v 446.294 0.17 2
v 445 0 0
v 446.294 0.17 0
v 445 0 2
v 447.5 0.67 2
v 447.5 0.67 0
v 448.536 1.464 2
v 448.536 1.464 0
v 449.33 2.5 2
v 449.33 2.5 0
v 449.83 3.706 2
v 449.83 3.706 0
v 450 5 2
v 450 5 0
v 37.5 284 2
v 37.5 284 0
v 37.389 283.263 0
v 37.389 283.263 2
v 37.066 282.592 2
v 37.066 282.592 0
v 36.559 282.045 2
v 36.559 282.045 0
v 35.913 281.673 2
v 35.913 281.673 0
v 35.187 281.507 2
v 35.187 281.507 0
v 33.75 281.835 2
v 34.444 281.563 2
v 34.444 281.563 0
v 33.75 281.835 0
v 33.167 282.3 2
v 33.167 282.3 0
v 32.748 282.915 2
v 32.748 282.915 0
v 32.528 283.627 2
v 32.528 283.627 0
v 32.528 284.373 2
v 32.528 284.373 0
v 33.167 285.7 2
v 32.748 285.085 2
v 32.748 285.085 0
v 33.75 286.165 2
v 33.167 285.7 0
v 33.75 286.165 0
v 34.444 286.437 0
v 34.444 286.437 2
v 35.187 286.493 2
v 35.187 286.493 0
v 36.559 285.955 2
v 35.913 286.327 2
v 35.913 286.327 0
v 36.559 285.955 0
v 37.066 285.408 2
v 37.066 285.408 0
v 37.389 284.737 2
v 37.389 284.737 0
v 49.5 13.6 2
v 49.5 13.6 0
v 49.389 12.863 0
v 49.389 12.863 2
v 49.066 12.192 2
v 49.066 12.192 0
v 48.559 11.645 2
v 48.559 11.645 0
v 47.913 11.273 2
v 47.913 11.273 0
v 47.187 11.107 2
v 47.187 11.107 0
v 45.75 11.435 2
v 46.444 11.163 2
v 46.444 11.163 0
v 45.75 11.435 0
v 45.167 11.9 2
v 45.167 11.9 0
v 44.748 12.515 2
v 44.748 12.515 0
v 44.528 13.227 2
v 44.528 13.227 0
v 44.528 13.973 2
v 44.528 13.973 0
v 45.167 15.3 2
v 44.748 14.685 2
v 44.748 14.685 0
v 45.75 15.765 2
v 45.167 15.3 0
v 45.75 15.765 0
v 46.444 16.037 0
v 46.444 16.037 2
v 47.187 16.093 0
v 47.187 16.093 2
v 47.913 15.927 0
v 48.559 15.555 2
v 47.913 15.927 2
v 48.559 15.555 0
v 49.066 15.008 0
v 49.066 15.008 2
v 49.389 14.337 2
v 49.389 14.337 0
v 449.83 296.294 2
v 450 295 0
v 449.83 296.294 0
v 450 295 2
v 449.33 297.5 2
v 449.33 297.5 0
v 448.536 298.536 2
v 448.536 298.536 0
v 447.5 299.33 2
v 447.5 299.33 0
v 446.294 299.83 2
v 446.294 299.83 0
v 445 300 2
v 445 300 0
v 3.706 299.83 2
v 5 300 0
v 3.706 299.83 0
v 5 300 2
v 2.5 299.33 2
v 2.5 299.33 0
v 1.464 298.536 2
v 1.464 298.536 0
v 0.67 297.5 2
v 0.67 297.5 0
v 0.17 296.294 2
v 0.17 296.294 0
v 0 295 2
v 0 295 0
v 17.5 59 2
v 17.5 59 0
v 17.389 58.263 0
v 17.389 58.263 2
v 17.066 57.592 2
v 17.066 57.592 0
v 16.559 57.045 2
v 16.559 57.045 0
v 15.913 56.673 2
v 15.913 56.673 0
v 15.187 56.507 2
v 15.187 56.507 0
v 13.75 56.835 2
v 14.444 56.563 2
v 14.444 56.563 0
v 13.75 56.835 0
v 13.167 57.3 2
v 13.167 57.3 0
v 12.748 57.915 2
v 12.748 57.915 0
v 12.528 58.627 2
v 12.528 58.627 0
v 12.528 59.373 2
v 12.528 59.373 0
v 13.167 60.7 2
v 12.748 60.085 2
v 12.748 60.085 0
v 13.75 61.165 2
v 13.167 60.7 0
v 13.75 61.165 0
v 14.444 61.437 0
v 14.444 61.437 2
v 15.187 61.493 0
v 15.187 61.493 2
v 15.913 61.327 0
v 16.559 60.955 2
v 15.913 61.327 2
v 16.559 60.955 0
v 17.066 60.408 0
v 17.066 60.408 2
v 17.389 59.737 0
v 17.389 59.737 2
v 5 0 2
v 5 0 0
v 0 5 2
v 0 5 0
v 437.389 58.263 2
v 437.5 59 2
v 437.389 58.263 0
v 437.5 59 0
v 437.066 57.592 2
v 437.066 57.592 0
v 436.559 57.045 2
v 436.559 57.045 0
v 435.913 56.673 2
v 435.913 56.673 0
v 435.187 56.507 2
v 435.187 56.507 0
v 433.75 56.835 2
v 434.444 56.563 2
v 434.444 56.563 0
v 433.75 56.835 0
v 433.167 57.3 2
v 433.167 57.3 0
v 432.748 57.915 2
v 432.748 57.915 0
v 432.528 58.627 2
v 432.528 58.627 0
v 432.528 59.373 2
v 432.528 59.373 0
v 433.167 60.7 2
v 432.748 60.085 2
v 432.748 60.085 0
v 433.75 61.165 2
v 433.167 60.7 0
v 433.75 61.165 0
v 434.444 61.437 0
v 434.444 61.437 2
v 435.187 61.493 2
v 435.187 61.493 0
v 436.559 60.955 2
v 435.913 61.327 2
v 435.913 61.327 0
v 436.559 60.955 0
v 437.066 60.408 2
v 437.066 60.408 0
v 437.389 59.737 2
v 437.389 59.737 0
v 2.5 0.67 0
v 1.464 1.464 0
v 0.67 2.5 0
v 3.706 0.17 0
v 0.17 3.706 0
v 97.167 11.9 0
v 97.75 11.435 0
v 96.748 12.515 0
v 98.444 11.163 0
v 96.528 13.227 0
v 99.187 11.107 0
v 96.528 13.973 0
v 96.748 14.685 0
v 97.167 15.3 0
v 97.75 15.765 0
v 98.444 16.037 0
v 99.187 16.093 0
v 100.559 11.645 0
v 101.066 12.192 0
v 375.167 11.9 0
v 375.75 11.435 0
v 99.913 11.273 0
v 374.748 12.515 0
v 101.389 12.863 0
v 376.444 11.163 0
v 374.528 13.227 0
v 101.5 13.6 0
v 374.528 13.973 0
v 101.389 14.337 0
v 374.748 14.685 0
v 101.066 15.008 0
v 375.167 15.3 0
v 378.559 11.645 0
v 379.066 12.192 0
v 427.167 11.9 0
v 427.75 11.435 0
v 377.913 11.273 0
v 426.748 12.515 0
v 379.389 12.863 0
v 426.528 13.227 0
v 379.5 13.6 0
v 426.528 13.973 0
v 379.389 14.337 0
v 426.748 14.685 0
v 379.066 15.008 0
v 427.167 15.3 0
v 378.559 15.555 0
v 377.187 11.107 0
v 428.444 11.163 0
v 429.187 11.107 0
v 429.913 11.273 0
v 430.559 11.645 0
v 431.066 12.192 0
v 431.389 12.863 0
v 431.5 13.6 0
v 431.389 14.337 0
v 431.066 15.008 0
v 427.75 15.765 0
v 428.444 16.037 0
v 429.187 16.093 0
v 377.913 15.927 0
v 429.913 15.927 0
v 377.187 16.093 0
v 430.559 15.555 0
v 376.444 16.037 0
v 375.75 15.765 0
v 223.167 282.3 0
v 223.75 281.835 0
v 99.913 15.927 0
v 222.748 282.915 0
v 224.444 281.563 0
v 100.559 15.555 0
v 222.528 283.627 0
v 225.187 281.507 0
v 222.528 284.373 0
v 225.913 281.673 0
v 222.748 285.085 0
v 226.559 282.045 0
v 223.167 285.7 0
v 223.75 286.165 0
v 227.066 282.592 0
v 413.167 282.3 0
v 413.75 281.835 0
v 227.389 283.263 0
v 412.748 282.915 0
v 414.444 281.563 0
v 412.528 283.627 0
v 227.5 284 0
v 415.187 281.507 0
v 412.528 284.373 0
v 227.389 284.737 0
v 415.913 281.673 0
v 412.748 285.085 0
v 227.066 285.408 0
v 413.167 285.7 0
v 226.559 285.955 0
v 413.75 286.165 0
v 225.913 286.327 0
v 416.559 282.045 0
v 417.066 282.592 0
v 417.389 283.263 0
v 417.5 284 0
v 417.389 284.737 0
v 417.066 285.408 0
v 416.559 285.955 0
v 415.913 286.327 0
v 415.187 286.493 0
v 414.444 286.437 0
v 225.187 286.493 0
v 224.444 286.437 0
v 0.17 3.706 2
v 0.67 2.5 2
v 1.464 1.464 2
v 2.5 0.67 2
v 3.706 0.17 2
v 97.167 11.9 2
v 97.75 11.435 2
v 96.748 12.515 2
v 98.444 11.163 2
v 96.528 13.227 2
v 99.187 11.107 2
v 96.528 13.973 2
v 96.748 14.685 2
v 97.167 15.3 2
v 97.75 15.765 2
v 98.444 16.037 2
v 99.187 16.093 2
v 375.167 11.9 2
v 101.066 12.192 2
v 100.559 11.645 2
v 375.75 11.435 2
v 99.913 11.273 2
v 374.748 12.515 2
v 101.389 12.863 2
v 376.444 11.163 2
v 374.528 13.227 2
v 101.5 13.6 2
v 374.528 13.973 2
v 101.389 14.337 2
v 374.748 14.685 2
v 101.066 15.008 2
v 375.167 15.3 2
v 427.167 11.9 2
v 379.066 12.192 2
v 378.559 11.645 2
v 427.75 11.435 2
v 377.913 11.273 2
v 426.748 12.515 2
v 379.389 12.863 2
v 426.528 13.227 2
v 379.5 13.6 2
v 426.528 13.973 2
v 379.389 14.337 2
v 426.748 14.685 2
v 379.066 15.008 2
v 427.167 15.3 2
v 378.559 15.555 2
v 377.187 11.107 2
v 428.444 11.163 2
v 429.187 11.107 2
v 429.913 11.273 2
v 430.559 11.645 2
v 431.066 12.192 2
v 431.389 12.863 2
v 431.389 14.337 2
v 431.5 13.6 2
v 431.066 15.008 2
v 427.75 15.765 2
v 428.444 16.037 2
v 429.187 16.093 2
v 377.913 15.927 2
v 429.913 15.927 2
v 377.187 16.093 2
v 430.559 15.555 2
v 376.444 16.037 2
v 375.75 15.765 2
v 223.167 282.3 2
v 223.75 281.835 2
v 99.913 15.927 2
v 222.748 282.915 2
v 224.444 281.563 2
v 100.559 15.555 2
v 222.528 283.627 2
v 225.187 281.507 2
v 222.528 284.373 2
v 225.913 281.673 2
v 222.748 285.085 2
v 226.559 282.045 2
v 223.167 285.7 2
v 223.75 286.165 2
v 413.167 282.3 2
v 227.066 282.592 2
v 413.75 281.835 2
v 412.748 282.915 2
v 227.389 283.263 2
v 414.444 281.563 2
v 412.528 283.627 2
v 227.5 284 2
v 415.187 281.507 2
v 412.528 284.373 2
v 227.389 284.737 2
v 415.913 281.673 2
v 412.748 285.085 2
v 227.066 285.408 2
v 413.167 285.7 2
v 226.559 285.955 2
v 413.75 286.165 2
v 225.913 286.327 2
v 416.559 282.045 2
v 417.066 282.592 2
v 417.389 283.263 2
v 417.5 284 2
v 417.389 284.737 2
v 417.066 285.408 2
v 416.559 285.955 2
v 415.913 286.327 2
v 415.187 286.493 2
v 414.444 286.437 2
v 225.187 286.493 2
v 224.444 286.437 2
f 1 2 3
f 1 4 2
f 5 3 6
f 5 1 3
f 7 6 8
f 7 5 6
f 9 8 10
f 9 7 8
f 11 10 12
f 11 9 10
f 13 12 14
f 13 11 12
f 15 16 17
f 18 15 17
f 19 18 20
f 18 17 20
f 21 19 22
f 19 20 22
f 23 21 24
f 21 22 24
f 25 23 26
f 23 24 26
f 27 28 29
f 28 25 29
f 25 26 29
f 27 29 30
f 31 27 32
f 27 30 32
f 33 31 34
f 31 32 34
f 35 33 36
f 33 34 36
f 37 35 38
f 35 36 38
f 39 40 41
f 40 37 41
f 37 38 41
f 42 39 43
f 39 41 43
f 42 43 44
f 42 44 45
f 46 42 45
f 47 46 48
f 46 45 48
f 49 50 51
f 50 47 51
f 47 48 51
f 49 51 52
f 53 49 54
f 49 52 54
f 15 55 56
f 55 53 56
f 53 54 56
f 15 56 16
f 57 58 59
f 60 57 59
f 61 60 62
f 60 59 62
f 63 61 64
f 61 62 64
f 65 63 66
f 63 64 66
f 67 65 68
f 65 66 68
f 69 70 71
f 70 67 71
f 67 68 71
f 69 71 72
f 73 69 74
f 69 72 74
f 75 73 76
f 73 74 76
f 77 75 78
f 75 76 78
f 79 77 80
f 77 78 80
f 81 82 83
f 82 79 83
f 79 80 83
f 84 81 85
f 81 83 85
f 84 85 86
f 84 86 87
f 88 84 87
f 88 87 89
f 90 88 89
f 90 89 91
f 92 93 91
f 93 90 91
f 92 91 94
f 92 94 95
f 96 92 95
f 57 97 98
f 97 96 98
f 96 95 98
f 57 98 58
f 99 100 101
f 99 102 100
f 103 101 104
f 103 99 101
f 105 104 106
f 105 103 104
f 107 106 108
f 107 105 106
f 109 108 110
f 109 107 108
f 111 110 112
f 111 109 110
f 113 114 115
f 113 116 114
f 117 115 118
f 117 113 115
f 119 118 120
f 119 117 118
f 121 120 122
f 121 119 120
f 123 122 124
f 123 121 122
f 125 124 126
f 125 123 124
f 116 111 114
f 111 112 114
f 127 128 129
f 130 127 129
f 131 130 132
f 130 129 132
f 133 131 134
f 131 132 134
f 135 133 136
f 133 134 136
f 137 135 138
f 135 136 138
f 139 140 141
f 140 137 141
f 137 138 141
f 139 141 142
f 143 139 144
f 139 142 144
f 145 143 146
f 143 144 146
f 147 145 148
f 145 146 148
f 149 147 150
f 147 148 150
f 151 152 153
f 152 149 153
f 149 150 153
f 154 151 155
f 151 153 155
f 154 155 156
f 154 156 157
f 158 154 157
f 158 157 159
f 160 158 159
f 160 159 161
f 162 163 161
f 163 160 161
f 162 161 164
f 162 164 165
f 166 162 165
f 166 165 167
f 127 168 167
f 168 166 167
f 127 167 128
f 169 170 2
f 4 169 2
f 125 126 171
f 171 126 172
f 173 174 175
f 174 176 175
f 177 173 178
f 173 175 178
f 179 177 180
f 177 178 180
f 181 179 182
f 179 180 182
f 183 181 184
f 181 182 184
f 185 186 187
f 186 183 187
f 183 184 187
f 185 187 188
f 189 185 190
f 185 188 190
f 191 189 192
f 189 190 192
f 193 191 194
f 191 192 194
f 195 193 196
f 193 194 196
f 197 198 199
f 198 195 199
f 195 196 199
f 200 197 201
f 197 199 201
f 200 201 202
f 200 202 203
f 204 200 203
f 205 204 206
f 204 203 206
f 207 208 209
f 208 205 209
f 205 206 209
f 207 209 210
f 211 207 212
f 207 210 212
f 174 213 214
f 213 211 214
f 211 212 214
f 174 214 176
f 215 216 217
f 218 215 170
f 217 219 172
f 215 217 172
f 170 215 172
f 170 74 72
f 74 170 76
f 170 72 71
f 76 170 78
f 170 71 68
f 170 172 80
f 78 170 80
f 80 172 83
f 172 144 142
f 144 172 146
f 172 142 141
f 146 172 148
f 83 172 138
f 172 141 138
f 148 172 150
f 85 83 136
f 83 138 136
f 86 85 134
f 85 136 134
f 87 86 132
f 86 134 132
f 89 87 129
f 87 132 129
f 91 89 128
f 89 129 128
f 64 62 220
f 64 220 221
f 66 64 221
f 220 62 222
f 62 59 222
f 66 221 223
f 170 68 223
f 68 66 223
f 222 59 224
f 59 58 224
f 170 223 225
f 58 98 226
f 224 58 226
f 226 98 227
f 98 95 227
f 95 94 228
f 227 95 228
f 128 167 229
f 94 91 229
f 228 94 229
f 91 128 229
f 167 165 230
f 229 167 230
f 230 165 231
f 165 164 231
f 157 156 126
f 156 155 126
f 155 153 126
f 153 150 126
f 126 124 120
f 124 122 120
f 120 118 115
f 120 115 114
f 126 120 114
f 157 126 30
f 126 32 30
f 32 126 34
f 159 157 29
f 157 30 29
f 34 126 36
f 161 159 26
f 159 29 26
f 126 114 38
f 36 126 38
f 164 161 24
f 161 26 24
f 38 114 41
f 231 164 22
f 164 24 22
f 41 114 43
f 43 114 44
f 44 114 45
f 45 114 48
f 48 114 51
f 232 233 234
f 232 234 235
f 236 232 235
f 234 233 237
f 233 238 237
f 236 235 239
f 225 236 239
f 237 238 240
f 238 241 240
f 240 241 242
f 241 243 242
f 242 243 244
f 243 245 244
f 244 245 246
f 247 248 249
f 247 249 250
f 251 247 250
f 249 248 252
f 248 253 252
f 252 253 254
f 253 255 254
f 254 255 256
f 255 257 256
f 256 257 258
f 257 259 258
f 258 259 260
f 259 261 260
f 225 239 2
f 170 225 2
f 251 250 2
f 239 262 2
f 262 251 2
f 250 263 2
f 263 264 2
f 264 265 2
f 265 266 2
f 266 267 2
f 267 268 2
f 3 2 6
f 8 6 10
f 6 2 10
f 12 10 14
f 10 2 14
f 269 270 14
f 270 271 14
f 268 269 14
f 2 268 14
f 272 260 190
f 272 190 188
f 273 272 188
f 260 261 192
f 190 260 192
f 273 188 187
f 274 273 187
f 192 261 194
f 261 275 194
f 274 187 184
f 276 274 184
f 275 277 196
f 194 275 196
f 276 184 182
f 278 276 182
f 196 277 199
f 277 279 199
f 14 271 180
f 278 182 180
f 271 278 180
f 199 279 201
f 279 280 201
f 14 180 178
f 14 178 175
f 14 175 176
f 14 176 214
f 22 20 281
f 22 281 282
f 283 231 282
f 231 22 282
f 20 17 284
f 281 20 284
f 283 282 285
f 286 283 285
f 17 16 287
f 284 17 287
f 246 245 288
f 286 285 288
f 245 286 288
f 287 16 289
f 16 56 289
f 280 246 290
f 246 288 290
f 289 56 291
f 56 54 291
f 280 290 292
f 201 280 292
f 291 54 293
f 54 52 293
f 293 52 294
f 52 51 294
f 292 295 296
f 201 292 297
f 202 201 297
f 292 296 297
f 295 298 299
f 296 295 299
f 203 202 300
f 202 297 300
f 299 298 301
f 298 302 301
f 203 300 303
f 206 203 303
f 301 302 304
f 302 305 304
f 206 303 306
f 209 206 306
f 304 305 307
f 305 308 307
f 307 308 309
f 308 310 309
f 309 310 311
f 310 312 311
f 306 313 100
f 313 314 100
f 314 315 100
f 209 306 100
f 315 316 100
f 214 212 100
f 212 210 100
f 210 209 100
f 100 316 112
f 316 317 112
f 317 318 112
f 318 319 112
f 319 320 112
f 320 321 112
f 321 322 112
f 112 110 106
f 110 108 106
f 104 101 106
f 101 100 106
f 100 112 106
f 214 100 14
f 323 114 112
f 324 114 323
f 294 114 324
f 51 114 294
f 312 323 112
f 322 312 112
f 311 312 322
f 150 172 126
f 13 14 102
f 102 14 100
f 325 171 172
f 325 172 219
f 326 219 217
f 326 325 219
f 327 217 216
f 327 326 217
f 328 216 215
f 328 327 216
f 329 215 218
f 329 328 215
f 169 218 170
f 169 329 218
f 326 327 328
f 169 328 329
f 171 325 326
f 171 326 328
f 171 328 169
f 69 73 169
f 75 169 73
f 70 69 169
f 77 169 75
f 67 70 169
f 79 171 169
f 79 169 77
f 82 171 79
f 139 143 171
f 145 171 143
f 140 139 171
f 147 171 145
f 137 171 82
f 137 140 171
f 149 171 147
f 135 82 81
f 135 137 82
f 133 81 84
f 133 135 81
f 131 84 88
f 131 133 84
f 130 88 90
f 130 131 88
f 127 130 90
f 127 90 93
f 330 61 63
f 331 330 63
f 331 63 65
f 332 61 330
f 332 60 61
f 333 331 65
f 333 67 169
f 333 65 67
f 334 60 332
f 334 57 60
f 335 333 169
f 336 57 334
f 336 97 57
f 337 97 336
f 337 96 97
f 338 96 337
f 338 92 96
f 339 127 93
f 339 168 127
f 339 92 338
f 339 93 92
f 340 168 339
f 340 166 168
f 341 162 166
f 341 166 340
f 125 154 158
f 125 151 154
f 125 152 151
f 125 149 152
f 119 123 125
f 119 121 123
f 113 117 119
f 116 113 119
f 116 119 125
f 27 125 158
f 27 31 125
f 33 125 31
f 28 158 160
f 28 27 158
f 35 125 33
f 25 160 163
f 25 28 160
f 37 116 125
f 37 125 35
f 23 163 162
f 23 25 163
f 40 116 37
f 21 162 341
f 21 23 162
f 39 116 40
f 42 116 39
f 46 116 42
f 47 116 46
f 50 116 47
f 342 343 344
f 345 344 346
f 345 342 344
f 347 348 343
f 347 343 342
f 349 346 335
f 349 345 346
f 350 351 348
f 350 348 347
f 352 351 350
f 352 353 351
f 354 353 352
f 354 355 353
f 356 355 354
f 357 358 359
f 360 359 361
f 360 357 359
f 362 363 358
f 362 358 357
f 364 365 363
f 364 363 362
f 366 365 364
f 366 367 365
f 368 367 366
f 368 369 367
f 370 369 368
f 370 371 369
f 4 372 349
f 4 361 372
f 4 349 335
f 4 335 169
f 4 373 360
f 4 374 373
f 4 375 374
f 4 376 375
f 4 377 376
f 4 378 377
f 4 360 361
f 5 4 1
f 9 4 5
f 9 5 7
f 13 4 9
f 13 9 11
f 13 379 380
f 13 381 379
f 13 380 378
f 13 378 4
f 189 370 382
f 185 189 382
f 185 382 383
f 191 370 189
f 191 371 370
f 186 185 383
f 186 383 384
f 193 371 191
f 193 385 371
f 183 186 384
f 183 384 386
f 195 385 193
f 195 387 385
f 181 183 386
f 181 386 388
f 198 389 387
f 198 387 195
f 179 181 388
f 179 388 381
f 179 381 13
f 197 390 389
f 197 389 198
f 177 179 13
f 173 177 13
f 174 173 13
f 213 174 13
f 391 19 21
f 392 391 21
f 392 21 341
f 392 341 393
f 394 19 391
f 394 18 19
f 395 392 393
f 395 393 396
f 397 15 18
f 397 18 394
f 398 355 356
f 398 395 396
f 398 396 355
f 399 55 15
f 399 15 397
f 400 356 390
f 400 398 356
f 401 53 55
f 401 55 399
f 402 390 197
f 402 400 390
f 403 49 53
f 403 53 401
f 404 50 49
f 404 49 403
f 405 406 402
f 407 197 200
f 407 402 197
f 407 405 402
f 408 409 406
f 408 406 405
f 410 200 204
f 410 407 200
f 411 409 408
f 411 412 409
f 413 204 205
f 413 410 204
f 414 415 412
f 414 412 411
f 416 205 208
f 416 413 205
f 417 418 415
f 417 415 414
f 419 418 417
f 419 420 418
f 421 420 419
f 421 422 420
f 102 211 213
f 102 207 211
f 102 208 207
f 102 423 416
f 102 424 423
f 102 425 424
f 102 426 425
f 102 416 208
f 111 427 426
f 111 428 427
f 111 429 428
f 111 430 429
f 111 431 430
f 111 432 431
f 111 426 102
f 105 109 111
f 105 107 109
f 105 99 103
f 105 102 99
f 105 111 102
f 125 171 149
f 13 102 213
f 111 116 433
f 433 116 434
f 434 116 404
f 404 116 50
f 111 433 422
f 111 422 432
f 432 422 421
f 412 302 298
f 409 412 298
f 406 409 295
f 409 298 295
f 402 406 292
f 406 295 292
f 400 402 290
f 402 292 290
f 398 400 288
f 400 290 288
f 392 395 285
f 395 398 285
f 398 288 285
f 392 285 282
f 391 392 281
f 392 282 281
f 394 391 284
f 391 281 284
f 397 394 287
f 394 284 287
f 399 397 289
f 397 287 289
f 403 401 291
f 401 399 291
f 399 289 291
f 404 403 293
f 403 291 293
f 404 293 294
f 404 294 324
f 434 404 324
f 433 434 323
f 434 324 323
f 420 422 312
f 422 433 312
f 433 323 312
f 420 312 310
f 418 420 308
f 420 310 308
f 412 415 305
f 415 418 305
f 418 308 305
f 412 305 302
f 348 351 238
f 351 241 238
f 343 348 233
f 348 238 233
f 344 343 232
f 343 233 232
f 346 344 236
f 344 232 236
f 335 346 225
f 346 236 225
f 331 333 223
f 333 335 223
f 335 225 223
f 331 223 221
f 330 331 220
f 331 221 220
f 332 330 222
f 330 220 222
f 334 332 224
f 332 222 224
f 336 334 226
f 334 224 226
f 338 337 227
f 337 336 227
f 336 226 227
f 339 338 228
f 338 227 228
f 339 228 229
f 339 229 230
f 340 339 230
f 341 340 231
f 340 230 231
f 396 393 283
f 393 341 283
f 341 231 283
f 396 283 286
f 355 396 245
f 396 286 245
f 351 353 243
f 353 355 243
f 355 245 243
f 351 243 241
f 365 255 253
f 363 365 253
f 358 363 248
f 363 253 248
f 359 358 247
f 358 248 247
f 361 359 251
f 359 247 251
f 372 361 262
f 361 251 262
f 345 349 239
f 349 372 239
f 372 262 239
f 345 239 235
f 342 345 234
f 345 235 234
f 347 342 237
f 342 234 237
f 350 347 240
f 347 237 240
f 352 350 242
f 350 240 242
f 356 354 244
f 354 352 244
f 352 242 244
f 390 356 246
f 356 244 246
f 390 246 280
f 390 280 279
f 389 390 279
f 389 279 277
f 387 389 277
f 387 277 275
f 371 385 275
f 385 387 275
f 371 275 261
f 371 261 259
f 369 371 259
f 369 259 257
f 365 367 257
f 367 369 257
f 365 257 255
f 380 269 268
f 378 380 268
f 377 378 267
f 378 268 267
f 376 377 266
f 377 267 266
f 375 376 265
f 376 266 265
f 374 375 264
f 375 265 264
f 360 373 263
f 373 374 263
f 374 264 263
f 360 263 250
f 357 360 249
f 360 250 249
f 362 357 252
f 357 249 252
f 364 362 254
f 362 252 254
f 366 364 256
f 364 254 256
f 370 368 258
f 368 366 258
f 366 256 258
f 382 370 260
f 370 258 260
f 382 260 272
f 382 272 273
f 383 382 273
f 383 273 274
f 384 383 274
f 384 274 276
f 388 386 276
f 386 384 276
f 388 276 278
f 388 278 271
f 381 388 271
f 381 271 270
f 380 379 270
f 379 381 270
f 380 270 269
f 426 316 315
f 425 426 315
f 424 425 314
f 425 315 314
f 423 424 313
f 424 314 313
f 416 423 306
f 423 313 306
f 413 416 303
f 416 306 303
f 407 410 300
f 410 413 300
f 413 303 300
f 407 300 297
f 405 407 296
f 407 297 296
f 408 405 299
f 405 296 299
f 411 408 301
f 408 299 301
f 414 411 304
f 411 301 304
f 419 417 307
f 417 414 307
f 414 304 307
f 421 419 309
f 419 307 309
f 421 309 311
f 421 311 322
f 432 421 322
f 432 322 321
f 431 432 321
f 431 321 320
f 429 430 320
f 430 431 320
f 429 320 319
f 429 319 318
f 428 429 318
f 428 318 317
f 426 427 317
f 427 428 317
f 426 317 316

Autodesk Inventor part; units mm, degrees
ref_plane "YZ Plane" through (0, 0, 0) normal (1, 0, 0) x (0, 1, 0)
ref_plane "XZ Plane" through (0, 0, 0) normal (0, 1, 0) x (-1, 0, 0)
ref_plane "XY Plane" through (0, 0, 0) normal (0, 0, 1) x (1, 0, 0)
sketch "スケッチ1" plane through (0, 0, 0) normal (0, 0, 1) x (1, 0, 0)
  line L0 (0, 0) -> (450, 0)
  line L1 (450, 0) -> (450, 300)
  line L2 (450, 300) -> (0, 300)
  line L3 (0, 300) -> (0, 0)
  line L4 (435, 285) -> (435, 15) construction
  line L5 (435, 15) -> (15, 15) construction
  line L6 (15, 15) -> (15, 285) construction
  circle A0 centre (35, 284) radius 2.5
  circle A1 centre (415, 284) radius 2.5
  circle A2 centre (225, 284) radius 2.5
  circle A3 centre (47, 13.6) radius 2.5
  circle A4 centre (99, 13.6) radius 2.5
  line L7 (47, 13.6) -> (99, 13.6) construction
  circle A5 centre (429, 13.6) radius 2.5
  circle A6 centre (377, 13.6) radius 2.5
  line L8 (429, 13.6) -> (377, 13.6) construction
  line L9 (225, 0) -> (225, 15) construction
  circle A7 centre (435, 59) radius 2.5
  circle A8 centre (15, 59) radius 2.5
  line L10 (35, 284) -> (415, 284) construction
  dimension "d0" = 450
  dimension "d1" = 300
  dimension "d3" = 35
  dimension "d4" = 35
  dimension "d5" = 5
  dimension "d8" = 13.6
  dimension "d9" = 5
  dimension "d10" = 47
  dimension "d11" = 52
  dimension "d12" = 21
  dimension "d13" = 13.6
  dimension "d14" = 52
  dimension "d19" = 16
  dimension "d20" = 59
  dimension "d21" = 59
  dimension "d22" = 15
extrude "押し出し1" add sketch "スケッチ1" along normal blind 2
fillet "フィレット1" radius 5 4 edges at (450, 0, 1) (450, 300, 1) (0, 0, 1) (0, 300, 1)
properties part number "防水2" material "PET プラスチック"
